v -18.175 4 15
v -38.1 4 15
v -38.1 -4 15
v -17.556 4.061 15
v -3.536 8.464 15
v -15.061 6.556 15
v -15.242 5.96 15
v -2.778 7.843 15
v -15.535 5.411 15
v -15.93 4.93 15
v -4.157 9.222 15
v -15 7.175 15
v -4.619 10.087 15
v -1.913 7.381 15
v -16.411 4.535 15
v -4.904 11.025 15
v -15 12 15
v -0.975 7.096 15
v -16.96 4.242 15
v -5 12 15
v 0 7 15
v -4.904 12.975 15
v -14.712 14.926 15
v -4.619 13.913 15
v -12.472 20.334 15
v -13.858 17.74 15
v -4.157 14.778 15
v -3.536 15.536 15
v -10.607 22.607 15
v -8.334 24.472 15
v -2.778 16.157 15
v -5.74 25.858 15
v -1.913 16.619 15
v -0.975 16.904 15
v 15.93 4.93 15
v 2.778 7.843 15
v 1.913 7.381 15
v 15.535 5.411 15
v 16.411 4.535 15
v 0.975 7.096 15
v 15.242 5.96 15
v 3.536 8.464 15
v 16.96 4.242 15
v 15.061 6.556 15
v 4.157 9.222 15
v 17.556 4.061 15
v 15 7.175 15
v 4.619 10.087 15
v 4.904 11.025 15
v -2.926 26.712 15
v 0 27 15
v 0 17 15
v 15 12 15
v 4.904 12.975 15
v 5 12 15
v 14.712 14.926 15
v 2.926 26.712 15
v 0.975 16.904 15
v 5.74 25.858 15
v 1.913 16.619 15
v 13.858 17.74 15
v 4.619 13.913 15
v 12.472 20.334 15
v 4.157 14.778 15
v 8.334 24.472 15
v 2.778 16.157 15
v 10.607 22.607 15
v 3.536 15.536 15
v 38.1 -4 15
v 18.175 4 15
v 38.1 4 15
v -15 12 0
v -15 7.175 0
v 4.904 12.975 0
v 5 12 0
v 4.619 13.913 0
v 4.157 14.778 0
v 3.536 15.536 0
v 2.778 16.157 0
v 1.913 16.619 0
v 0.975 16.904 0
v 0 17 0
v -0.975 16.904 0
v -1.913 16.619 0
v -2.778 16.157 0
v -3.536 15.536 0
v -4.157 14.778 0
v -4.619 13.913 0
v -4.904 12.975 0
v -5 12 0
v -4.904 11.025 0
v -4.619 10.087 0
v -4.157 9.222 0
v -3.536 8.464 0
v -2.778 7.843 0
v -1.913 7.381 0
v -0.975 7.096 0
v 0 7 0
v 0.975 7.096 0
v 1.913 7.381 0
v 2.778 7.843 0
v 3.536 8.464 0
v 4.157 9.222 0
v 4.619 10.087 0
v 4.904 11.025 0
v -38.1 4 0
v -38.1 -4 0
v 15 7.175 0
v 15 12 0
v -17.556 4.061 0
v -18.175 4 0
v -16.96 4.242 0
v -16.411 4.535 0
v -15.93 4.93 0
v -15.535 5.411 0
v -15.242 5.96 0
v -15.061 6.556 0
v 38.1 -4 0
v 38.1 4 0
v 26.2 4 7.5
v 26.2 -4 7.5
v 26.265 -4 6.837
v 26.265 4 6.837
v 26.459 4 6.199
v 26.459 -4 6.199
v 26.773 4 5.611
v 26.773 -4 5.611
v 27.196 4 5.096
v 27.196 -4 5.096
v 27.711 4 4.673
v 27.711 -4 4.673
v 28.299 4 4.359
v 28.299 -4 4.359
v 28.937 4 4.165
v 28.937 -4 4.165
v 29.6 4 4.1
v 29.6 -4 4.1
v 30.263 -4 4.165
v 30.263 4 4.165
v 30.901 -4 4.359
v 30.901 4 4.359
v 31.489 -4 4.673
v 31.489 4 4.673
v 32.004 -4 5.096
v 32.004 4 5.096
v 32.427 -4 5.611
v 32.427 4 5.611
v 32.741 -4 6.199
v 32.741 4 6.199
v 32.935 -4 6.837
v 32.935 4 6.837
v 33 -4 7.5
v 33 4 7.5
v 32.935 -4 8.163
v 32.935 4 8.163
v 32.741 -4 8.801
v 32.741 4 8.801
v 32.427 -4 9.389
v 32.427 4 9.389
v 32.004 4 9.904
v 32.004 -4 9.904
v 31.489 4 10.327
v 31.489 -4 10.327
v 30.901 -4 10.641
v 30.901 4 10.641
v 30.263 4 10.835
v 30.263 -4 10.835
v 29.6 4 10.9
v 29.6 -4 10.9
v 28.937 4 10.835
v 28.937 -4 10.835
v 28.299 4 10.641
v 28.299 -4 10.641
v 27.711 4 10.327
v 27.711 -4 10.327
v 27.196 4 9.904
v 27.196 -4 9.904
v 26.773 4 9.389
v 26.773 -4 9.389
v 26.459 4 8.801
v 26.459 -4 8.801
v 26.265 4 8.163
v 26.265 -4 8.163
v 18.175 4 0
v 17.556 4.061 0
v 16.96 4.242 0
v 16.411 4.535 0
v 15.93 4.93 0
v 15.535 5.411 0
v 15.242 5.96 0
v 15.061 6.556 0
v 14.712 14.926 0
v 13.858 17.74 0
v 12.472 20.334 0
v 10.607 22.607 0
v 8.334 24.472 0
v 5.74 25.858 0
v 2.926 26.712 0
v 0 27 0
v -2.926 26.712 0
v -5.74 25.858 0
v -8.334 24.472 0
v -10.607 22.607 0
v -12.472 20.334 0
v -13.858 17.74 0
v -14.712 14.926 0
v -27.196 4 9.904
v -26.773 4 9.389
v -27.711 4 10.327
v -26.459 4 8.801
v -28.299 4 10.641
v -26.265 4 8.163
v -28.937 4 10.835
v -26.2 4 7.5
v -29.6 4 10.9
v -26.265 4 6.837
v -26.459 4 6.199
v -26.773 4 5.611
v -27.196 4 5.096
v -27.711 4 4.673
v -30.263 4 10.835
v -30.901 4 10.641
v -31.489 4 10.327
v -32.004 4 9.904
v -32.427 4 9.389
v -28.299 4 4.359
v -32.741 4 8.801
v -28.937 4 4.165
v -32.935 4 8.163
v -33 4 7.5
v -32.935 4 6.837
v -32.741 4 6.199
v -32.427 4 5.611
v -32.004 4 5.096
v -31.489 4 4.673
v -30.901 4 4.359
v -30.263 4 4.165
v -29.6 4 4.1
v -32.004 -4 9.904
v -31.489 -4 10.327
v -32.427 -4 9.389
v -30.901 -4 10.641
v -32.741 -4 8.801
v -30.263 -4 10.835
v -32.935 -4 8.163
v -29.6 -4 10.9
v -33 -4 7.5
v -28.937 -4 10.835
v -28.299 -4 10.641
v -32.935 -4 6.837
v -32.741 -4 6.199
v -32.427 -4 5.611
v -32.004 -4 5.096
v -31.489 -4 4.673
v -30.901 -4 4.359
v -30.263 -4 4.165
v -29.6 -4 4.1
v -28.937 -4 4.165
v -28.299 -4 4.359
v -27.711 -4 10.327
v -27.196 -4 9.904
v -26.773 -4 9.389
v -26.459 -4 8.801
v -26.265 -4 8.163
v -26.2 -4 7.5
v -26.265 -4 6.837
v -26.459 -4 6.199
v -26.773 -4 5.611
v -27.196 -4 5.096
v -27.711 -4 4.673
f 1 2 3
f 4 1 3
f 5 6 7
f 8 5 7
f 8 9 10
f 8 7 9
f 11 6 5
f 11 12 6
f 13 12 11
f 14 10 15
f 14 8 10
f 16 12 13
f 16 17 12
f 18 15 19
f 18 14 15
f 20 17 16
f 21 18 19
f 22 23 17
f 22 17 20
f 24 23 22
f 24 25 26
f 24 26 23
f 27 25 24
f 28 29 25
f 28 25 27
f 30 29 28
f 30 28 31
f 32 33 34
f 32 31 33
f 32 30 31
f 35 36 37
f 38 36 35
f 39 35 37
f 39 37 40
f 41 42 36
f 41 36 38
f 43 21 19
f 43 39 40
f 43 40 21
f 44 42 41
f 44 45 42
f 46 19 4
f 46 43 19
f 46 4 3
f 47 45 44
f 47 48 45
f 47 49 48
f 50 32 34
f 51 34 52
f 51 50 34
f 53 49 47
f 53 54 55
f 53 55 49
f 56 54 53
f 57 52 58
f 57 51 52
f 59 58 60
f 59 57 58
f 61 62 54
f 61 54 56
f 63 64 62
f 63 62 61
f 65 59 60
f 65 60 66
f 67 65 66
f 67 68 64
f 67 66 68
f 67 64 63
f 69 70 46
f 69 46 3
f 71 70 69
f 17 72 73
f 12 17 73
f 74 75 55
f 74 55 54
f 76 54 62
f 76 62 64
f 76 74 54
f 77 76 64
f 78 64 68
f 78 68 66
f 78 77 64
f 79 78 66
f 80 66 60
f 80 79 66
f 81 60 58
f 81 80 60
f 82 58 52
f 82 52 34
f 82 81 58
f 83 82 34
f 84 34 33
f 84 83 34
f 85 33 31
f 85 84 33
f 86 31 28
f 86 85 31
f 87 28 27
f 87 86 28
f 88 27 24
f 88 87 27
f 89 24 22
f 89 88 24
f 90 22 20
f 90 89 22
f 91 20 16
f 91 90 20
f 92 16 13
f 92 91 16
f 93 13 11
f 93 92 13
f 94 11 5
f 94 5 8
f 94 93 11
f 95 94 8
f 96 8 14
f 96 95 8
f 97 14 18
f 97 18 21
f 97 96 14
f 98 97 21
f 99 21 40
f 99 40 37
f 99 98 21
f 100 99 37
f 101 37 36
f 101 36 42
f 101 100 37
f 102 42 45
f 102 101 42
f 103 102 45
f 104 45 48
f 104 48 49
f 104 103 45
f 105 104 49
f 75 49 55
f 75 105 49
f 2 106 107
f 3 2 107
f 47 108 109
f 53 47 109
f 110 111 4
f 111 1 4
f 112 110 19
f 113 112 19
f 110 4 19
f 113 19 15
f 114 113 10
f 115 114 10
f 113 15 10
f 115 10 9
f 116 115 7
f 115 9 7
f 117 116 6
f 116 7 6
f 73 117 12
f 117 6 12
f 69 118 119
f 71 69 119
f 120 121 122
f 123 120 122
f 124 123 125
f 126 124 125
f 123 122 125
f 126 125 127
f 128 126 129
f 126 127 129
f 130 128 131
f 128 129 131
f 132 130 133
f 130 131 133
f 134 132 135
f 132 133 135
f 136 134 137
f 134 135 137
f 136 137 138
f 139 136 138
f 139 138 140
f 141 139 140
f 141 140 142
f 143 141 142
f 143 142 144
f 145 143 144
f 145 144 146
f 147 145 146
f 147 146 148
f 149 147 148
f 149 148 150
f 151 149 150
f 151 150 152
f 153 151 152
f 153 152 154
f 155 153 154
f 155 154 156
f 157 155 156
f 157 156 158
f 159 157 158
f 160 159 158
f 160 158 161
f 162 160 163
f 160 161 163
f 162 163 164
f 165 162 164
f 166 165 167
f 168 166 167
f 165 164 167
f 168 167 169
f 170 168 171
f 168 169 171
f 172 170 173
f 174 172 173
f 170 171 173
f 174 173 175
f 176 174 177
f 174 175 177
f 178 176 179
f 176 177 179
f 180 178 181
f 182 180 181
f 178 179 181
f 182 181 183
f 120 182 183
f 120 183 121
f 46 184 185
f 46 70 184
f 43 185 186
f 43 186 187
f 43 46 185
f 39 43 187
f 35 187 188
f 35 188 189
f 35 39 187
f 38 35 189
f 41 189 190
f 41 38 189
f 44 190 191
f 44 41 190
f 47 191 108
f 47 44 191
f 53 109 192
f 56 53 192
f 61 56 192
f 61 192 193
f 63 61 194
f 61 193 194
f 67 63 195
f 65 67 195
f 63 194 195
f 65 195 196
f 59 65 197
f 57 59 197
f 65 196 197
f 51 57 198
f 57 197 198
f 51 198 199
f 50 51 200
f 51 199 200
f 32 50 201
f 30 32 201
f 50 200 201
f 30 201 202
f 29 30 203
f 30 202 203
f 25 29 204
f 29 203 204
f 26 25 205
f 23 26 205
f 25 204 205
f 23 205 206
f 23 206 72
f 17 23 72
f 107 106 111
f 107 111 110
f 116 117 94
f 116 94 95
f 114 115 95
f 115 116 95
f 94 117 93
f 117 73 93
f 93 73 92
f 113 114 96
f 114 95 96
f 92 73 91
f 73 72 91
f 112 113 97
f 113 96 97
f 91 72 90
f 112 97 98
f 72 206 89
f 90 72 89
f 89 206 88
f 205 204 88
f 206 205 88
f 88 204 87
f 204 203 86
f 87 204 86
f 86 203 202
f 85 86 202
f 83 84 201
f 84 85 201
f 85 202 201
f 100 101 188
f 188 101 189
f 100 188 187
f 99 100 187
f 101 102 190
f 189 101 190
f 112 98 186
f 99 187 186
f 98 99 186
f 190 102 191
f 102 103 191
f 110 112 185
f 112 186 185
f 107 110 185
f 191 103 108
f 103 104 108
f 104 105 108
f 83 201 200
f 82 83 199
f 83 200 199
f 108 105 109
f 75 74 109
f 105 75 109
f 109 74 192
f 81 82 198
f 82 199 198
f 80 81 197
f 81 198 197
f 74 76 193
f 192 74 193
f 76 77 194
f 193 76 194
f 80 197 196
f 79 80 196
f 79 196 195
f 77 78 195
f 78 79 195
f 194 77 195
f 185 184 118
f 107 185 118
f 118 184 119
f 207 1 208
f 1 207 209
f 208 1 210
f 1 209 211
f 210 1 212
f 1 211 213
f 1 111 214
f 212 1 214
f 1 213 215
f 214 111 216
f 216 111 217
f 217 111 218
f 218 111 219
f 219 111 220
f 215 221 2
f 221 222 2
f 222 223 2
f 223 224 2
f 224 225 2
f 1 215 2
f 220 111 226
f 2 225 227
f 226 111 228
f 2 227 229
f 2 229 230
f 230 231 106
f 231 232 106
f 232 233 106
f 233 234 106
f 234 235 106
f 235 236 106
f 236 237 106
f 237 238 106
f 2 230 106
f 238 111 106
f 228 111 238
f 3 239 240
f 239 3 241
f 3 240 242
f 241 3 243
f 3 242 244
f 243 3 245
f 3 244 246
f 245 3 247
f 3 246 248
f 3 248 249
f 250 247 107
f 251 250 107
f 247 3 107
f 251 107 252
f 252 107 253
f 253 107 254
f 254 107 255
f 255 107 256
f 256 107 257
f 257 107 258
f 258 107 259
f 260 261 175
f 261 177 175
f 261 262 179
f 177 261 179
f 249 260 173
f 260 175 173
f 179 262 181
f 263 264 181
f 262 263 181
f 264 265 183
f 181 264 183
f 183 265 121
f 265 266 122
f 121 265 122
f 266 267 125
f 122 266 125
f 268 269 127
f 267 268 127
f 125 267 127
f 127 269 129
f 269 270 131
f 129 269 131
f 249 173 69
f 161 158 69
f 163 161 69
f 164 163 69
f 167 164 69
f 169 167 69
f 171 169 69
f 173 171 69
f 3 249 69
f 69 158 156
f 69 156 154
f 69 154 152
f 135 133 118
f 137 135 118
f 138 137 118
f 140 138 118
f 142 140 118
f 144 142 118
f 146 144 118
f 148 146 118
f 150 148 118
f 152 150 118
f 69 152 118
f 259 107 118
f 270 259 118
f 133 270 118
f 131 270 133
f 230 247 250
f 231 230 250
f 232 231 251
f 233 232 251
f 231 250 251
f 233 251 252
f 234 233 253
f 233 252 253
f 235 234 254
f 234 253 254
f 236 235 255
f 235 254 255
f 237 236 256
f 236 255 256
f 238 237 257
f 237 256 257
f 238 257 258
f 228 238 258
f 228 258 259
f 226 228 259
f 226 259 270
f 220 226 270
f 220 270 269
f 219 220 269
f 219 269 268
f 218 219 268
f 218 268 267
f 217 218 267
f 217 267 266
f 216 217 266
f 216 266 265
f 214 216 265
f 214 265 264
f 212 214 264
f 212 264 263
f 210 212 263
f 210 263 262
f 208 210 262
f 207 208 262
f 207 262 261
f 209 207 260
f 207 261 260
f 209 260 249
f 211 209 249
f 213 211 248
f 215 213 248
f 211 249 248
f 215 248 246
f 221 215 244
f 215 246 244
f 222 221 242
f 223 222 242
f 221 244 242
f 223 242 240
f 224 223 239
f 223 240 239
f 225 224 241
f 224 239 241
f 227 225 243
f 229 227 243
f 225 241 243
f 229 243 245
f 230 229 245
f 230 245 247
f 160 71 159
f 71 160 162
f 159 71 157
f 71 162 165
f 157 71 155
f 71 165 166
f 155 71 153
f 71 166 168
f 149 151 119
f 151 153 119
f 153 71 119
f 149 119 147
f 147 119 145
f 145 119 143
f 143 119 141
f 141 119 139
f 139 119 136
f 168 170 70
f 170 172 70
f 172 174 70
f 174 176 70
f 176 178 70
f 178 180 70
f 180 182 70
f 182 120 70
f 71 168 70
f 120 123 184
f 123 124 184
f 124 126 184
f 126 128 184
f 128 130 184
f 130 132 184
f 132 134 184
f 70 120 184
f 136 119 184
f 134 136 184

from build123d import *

# Parameters (mm, degrees)
SKETCH1_R                        = 5
BOSS_EXTRUDE1_DEPTH              = 15
FILLET1_R                        = 3.175
TAP_DRILL_FOR_M8X1_25_TAP1_D     = 6.8
TAP_DRILL_FOR_M8X1_25_TAP1_DEPTH = 20
TAP_DRILL_FOR_M8X1_25_TAP1_TIP   = 2.042926105


with BuildPart() as part:
    # Sketch1 → Boss-Extrude1 (new body)
    with BuildSketch(Plane.XY):
        with BuildLine():
            Line((-38.1, 4), (-38.1, -4))
            Line((-38.1, -4), (38.1, -4))
            Line((38.1, -4), (38.1, 4))
            Line((38.1, 4), (15, 4))
            Line((15, 4), (15, 12))
            ThreePointArc((15, 12), (0, 27), (-15, 12))
            Line((-15, 12), (-15, 4))
            Line((-15, 4), (-38.1, 4))
        make_face()
        with Locations((0, 12)):
            Circle(SKETCH1_R, mode=Mode.SUBTRACT)
    extrude(amount=BOSS_EXTRUDE1_DEPTH)

    # Fillet1
    fillet1_edges = [part.edges().sort_by_distance(p)[0] for p in [
        (15, 4, 7.5),
        (-15, 4, 7.5),
    ]]
    fillet(fillet1_edges, radius=FILLET1_R)

    # Tap Drill for M8x1.25 Tap1
    with Locations(Plane(origin=(0, 4, 0), x_dir=(1, 0, 0), z_dir=(0, 1, 0))):
        with Locations((29.6, -7.5), (-29.6, -7.5)):
            Hole(TAP_DRILL_FOR_M8X1_25_TAP1_D / 2, depth=TAP_DRILL_FOR_M8X1_25_TAP1_DEPTH)
            with Locations((0, 0, -(TAP_DRILL_FOR_M8X1_25_TAP1_DEPTH + TAP_DRILL_FOR_M8X1_25_TAP1_TIP / 2))):  # 118° drill point
                Cone(0, TAP_DRILL_FOR_M8X1_25_TAP1_D / 2, TAP_DRILL_FOR_M8X1_25_TAP1_TIP, mode=Mode.SUBTRACT)


solid = part.part
